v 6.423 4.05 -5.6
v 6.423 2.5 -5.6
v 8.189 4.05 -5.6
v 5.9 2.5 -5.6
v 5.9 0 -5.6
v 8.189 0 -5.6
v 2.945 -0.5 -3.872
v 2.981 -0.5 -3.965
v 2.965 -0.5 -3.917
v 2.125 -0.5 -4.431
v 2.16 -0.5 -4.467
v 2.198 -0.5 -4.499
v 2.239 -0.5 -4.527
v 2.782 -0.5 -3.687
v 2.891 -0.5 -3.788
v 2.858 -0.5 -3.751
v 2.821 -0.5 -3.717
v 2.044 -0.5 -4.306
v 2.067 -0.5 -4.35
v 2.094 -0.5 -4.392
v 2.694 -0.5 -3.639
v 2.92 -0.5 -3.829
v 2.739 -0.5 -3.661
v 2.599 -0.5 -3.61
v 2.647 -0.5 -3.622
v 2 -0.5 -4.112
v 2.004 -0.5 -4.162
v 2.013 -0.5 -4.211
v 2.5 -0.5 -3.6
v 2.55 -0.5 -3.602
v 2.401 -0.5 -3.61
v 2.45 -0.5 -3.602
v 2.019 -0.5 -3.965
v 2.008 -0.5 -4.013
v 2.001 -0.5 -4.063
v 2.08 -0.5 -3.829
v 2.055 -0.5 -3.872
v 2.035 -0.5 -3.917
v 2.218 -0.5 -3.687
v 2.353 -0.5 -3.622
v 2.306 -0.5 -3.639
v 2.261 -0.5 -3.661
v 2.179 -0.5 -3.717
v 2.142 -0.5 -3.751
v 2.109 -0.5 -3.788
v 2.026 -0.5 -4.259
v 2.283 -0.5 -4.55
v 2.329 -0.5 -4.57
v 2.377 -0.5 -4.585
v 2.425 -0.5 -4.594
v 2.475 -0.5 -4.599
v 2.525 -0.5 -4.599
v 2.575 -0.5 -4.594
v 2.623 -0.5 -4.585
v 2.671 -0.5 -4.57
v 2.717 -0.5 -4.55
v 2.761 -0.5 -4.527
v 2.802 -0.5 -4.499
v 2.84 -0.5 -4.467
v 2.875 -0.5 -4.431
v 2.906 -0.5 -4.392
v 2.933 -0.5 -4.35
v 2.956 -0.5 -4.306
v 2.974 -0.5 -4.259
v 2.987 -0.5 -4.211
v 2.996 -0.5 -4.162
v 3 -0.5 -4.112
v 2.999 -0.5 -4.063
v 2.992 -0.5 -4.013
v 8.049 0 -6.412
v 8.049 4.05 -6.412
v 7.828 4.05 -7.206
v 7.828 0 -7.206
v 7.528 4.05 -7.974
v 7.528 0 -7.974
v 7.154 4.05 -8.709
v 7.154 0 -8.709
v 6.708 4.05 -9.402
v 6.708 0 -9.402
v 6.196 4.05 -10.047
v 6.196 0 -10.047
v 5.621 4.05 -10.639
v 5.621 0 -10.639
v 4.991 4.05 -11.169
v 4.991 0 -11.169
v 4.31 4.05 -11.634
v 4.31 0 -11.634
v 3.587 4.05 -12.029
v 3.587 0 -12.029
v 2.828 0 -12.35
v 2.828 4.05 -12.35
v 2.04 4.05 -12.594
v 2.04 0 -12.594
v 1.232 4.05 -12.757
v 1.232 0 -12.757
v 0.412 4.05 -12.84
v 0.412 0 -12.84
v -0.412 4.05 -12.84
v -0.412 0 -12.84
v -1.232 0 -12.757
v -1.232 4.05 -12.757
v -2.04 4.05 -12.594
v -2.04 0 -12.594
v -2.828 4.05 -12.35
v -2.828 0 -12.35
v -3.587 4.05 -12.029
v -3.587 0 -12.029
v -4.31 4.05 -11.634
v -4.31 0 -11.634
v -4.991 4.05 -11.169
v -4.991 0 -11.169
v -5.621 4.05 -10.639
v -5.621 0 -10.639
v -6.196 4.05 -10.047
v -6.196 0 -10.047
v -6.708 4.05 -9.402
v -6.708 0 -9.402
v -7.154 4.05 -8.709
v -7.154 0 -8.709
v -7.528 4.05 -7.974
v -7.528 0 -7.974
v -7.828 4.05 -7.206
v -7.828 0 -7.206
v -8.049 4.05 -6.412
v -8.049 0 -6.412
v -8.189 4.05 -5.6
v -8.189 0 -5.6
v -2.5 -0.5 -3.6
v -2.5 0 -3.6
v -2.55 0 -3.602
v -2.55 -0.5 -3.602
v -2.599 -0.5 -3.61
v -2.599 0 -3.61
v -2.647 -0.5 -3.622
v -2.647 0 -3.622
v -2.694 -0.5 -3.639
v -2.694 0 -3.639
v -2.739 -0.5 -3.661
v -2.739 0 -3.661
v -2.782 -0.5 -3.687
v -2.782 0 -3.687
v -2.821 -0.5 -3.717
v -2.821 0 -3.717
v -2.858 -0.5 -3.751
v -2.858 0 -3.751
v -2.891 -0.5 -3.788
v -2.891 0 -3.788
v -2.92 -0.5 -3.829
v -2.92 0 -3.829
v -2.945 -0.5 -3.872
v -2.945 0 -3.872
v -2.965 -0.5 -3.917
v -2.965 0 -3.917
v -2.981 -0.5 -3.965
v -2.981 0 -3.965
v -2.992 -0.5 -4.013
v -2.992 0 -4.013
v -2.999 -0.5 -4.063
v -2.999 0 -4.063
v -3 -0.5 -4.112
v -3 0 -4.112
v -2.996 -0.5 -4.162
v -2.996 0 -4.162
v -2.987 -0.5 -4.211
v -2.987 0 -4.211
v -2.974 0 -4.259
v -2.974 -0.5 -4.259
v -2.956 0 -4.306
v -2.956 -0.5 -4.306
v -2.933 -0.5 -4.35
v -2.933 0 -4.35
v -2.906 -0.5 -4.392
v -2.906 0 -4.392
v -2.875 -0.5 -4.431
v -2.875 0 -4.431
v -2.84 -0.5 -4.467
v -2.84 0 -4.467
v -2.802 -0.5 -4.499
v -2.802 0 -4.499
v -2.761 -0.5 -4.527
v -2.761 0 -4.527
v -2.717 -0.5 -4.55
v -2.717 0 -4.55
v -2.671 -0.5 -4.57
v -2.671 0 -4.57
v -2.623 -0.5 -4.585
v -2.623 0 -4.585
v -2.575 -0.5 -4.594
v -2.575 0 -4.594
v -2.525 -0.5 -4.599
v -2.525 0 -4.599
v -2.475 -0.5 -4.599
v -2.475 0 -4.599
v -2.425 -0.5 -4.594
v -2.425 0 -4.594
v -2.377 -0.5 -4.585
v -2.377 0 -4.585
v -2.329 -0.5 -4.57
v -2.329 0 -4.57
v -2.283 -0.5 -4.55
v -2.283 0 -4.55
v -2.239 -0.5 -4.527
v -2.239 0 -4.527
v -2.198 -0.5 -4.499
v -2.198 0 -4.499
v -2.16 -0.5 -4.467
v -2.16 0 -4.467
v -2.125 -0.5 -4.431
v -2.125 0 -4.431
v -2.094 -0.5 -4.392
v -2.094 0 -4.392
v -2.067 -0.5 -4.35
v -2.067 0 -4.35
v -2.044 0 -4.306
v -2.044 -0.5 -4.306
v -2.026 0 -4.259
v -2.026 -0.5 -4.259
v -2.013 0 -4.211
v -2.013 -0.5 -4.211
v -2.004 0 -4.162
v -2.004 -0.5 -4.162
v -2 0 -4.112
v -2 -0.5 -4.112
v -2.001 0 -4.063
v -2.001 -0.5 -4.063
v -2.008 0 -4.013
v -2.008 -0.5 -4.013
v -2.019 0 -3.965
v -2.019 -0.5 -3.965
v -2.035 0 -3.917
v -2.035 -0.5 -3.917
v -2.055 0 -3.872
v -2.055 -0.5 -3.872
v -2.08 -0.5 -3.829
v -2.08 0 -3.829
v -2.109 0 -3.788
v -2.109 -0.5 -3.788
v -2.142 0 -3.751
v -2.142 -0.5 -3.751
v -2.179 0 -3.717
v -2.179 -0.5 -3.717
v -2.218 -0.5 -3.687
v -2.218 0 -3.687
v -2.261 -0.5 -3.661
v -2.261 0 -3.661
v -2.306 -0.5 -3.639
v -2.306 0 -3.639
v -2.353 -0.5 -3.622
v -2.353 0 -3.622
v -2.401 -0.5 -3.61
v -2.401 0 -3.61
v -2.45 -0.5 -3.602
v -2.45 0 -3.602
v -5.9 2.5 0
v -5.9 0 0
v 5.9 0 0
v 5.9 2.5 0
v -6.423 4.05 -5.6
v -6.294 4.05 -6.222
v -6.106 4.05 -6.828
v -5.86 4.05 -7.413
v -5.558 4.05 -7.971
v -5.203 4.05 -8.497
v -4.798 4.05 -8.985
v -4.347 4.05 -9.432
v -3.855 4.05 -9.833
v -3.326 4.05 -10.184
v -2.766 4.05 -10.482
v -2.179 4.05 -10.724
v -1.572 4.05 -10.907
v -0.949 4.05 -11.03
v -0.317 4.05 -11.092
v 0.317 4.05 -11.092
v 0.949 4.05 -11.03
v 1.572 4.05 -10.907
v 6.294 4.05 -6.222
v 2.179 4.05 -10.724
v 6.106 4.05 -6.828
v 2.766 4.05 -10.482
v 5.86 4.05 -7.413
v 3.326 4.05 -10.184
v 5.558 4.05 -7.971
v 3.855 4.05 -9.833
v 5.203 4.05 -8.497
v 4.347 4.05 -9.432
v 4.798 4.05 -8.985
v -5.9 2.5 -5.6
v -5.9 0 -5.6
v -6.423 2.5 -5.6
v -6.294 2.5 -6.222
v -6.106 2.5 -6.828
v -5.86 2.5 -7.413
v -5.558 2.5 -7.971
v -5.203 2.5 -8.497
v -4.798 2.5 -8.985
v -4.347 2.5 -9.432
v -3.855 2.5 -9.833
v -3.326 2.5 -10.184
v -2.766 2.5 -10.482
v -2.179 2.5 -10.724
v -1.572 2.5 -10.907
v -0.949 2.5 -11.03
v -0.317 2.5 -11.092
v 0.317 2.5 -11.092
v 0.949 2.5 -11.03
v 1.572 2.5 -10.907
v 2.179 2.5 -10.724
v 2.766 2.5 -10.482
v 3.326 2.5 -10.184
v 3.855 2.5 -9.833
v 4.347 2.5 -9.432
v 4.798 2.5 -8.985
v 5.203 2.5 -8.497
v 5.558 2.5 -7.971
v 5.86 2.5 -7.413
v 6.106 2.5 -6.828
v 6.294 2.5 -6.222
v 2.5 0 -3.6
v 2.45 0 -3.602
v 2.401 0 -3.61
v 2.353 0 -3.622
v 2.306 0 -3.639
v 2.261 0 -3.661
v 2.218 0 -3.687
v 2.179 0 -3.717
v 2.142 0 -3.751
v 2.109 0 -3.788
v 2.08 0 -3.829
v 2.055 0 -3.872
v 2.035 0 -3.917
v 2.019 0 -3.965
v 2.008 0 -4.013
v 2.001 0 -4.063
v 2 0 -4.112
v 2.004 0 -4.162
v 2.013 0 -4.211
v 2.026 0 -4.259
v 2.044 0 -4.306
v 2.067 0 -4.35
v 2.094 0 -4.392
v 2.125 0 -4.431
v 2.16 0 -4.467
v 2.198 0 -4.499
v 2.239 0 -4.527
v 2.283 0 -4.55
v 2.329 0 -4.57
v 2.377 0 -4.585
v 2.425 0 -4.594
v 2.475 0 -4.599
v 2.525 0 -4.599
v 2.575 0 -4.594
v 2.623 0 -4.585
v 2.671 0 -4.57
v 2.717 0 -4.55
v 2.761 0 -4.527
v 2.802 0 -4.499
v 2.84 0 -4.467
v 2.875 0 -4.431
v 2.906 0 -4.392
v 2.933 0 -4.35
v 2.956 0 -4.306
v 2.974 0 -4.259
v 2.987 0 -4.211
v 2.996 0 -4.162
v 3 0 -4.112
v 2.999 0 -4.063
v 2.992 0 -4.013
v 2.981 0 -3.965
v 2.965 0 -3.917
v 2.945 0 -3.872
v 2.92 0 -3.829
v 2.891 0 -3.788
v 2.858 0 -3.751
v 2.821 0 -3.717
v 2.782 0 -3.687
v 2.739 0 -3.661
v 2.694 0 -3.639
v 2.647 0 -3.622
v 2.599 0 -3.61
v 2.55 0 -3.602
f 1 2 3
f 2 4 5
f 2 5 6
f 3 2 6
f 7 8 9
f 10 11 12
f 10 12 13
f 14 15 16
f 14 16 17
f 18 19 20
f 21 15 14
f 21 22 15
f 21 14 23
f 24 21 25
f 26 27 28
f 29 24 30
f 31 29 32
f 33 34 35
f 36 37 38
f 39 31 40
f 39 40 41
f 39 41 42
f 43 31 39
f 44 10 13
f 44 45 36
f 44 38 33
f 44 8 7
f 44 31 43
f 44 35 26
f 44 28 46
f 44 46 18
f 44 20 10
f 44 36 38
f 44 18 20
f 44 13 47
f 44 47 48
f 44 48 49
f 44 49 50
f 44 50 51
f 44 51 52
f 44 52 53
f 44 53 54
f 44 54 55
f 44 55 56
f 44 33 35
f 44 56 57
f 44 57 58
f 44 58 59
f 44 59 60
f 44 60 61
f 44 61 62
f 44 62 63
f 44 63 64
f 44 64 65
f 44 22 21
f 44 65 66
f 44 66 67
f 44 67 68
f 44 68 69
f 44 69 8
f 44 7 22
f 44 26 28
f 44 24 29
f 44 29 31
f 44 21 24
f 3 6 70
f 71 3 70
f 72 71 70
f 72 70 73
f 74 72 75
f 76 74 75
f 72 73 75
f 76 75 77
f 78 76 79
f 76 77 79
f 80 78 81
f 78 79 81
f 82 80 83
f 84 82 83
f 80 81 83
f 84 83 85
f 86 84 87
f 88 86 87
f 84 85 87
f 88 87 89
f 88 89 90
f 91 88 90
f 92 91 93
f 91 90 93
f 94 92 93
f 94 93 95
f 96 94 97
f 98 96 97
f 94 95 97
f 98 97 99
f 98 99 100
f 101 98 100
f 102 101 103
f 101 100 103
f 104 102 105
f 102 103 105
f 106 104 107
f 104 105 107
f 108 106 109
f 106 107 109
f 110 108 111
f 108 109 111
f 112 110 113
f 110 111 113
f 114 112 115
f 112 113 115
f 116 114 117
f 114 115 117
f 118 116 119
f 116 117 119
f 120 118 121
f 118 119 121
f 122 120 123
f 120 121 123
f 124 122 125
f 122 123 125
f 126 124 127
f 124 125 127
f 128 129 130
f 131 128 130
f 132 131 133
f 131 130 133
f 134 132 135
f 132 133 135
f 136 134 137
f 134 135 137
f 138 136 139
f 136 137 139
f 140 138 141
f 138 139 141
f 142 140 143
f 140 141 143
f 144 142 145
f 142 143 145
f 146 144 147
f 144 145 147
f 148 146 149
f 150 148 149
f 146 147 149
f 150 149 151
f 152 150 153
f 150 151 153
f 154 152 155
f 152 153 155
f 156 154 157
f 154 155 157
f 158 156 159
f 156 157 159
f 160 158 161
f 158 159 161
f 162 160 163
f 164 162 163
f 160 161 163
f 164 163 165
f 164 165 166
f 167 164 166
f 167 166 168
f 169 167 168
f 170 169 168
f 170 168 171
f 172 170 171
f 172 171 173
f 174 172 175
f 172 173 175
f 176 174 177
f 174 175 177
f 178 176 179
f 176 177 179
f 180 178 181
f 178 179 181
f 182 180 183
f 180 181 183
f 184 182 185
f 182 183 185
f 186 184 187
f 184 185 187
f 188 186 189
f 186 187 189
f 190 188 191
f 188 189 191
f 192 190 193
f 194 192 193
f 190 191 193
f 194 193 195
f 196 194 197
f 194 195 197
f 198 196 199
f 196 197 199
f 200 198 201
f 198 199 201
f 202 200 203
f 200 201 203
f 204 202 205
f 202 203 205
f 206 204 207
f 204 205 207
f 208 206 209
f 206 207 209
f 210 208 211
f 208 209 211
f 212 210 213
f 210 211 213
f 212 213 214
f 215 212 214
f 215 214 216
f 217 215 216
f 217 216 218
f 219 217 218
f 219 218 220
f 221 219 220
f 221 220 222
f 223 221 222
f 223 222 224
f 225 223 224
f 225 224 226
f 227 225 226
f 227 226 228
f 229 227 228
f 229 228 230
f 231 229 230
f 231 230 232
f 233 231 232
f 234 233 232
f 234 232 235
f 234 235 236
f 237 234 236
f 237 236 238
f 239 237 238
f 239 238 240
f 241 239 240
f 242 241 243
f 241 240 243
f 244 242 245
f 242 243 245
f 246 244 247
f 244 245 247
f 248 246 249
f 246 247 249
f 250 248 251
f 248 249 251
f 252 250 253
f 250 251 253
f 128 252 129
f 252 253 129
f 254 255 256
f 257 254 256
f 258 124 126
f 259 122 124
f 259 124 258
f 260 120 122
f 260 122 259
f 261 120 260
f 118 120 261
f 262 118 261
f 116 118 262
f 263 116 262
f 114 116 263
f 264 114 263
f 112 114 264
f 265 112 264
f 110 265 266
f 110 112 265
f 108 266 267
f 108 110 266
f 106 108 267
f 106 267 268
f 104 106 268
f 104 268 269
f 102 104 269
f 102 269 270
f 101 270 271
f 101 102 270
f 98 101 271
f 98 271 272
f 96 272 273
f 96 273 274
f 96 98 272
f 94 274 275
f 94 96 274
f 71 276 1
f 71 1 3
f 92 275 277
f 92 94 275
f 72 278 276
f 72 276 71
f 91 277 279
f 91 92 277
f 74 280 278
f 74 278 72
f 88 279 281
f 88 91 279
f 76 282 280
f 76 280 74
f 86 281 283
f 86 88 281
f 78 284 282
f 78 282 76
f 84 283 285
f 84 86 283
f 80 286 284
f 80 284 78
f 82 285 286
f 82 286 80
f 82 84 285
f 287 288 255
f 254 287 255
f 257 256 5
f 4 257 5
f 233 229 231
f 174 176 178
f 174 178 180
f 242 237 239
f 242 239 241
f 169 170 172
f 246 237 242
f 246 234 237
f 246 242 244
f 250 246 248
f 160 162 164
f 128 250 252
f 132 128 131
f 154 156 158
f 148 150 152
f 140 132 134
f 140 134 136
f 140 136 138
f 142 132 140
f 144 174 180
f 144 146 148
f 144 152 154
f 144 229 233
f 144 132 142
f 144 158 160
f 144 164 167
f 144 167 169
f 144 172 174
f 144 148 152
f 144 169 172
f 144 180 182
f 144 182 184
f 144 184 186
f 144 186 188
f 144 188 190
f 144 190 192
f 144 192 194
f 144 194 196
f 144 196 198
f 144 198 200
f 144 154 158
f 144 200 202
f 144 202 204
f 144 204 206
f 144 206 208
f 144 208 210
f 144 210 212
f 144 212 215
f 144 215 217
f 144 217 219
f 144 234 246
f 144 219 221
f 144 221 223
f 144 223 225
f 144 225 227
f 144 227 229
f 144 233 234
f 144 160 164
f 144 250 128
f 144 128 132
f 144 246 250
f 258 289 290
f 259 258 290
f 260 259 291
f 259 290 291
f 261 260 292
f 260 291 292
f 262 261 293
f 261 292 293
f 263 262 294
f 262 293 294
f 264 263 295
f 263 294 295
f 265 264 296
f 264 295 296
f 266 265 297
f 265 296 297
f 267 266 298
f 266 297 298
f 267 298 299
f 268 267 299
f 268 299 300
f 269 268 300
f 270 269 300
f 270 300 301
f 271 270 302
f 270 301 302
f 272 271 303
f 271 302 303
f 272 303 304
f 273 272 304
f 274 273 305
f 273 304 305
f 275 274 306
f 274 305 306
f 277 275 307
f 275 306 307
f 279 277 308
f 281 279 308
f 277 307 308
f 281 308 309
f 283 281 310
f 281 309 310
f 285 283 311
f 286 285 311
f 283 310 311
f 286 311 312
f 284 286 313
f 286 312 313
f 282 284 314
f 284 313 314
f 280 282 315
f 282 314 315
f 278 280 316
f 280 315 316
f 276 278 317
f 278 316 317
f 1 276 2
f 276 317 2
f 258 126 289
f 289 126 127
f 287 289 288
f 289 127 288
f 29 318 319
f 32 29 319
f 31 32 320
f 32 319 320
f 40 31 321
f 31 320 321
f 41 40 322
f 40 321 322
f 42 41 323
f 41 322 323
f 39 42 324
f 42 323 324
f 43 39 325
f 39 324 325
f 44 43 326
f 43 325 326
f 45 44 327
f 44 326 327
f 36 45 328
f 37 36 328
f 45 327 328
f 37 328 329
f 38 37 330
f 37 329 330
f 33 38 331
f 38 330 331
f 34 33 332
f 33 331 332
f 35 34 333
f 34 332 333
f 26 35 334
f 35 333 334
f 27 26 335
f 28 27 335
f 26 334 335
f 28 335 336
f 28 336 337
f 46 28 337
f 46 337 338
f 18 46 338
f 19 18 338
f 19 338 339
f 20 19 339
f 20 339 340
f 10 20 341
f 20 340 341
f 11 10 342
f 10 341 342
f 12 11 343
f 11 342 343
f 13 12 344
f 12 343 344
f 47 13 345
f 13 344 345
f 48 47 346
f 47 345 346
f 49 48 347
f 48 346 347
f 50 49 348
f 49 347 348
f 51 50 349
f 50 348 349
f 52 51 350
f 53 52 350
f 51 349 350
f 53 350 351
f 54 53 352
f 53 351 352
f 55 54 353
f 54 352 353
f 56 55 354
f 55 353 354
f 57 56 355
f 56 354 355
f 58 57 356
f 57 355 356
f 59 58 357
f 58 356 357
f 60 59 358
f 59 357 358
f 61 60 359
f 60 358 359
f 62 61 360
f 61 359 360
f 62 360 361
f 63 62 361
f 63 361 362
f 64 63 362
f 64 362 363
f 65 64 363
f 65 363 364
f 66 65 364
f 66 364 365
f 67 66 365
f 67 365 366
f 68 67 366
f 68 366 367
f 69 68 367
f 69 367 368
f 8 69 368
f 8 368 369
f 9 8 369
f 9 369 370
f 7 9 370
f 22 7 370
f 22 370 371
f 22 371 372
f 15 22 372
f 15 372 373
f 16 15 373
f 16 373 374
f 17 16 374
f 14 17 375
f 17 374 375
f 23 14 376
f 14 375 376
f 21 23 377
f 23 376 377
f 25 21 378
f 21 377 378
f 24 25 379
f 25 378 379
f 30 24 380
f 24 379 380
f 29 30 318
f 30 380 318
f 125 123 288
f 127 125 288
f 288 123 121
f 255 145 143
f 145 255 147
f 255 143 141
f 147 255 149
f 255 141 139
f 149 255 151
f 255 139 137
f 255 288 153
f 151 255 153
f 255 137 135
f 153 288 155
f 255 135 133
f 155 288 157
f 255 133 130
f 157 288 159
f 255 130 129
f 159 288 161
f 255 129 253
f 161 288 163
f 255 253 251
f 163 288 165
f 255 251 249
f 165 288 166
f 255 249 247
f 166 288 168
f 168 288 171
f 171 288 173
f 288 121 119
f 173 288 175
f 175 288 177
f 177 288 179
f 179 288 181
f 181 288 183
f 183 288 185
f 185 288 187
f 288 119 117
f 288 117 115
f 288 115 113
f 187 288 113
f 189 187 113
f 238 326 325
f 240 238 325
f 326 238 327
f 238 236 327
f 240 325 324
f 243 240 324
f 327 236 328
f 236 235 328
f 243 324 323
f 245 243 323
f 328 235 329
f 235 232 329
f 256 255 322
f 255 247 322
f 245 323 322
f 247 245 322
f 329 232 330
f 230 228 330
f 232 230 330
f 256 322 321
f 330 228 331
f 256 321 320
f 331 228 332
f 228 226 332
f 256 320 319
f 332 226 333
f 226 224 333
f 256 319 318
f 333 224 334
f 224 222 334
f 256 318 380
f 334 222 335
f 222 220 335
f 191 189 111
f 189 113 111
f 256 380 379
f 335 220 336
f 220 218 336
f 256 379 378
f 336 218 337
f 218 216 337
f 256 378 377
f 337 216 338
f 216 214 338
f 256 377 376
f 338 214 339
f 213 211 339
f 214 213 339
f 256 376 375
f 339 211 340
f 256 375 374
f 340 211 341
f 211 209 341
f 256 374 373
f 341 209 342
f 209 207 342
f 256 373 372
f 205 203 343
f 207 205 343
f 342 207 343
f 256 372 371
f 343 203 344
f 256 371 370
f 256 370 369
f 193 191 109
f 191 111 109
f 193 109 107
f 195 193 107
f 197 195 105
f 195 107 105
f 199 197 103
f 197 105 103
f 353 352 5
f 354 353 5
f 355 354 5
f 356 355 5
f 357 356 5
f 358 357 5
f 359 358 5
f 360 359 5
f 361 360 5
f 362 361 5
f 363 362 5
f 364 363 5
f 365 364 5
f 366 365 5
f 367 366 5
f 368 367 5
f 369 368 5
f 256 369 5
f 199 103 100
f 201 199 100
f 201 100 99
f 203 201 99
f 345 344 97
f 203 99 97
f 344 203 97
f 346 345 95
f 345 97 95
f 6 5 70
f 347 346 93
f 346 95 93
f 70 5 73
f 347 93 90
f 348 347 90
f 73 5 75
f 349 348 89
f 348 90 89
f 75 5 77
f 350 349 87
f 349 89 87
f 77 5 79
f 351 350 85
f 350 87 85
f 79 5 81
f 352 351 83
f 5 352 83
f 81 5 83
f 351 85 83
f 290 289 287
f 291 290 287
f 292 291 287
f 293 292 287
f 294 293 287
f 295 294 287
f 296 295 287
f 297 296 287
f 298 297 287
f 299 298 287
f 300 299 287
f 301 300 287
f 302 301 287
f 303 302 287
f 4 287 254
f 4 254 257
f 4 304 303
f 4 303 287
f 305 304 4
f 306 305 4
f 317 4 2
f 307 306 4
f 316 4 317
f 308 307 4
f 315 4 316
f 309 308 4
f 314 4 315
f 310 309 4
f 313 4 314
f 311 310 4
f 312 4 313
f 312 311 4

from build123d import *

# Parameters (mm, degrees)
EXTRUDE_1_DEPTH = 2.5
EXTRUDE_2_DEPTH = 1.55
SKETCH_3_R      = 0.5
EXTRUDE_3_DEPTH = 0.5


with BuildPart() as part:
    # 草图1 → 凸台-拉伸1 (new body)
    with BuildSketch(Plane(origin=(0, 0, 0), x_dir=(1, 0, 0), z_dir=(0, 1, 0))):
        with BuildLine():
            Line((-5.9, 0), (5.9, 0))
            Line((5.9, 0), (5.9, 5.6))
            Line((5.9, 5.6), (8.189169677, 5.6))
            ThreePointArc((8.189169677, 5.6), (0, 12.85), (-8.189169677, 5.6))
            Line((-8.189169677, 5.6), (-5.9, 5.6))
            Line((-5.9, 5.6), (-5.9, 0))
        make_face()
    extrude(amount=EXTRUDE_1_DEPTH)

    # 草图2 → 凸台-拉伸2 (add)
    with BuildSketch(Plane(origin=(0, 2.5, 0), x_dir=(1, 0, 0), z_dir=(0, 1, 0))):
        with BuildLine():
            Line((-8.189169677, 5.6), (-6.422616289, 5.6))
            ThreePointArc((-6.422616289, 5.6), (0, 11.1), (6.422616289, 5.6))
            Line((6.422616289, 5.6), (8.189169677, 5.6))
            ThreePointArc((8.189169677, 5.6), (0, 12.85), (-8.189169677, 5.6))
        make_face()
    extrude(amount=EXTRUDE_2_DEPTH)

    # 草图3 → 凸台-拉伸3 (add)
    with BuildSketch(Plane.XZ):
        with Locations(Location((-2.5, -4.1, 0), (0, 0, 90))):
            Circle(SKETCH_3_R)
        with Locations(Location((2.5, -4.1, 0), (0, 0, 90))):
            Circle(SKETCH_3_R)
    extrude(amount=EXTRUDE_3_DEPTH)


solid = part.part
